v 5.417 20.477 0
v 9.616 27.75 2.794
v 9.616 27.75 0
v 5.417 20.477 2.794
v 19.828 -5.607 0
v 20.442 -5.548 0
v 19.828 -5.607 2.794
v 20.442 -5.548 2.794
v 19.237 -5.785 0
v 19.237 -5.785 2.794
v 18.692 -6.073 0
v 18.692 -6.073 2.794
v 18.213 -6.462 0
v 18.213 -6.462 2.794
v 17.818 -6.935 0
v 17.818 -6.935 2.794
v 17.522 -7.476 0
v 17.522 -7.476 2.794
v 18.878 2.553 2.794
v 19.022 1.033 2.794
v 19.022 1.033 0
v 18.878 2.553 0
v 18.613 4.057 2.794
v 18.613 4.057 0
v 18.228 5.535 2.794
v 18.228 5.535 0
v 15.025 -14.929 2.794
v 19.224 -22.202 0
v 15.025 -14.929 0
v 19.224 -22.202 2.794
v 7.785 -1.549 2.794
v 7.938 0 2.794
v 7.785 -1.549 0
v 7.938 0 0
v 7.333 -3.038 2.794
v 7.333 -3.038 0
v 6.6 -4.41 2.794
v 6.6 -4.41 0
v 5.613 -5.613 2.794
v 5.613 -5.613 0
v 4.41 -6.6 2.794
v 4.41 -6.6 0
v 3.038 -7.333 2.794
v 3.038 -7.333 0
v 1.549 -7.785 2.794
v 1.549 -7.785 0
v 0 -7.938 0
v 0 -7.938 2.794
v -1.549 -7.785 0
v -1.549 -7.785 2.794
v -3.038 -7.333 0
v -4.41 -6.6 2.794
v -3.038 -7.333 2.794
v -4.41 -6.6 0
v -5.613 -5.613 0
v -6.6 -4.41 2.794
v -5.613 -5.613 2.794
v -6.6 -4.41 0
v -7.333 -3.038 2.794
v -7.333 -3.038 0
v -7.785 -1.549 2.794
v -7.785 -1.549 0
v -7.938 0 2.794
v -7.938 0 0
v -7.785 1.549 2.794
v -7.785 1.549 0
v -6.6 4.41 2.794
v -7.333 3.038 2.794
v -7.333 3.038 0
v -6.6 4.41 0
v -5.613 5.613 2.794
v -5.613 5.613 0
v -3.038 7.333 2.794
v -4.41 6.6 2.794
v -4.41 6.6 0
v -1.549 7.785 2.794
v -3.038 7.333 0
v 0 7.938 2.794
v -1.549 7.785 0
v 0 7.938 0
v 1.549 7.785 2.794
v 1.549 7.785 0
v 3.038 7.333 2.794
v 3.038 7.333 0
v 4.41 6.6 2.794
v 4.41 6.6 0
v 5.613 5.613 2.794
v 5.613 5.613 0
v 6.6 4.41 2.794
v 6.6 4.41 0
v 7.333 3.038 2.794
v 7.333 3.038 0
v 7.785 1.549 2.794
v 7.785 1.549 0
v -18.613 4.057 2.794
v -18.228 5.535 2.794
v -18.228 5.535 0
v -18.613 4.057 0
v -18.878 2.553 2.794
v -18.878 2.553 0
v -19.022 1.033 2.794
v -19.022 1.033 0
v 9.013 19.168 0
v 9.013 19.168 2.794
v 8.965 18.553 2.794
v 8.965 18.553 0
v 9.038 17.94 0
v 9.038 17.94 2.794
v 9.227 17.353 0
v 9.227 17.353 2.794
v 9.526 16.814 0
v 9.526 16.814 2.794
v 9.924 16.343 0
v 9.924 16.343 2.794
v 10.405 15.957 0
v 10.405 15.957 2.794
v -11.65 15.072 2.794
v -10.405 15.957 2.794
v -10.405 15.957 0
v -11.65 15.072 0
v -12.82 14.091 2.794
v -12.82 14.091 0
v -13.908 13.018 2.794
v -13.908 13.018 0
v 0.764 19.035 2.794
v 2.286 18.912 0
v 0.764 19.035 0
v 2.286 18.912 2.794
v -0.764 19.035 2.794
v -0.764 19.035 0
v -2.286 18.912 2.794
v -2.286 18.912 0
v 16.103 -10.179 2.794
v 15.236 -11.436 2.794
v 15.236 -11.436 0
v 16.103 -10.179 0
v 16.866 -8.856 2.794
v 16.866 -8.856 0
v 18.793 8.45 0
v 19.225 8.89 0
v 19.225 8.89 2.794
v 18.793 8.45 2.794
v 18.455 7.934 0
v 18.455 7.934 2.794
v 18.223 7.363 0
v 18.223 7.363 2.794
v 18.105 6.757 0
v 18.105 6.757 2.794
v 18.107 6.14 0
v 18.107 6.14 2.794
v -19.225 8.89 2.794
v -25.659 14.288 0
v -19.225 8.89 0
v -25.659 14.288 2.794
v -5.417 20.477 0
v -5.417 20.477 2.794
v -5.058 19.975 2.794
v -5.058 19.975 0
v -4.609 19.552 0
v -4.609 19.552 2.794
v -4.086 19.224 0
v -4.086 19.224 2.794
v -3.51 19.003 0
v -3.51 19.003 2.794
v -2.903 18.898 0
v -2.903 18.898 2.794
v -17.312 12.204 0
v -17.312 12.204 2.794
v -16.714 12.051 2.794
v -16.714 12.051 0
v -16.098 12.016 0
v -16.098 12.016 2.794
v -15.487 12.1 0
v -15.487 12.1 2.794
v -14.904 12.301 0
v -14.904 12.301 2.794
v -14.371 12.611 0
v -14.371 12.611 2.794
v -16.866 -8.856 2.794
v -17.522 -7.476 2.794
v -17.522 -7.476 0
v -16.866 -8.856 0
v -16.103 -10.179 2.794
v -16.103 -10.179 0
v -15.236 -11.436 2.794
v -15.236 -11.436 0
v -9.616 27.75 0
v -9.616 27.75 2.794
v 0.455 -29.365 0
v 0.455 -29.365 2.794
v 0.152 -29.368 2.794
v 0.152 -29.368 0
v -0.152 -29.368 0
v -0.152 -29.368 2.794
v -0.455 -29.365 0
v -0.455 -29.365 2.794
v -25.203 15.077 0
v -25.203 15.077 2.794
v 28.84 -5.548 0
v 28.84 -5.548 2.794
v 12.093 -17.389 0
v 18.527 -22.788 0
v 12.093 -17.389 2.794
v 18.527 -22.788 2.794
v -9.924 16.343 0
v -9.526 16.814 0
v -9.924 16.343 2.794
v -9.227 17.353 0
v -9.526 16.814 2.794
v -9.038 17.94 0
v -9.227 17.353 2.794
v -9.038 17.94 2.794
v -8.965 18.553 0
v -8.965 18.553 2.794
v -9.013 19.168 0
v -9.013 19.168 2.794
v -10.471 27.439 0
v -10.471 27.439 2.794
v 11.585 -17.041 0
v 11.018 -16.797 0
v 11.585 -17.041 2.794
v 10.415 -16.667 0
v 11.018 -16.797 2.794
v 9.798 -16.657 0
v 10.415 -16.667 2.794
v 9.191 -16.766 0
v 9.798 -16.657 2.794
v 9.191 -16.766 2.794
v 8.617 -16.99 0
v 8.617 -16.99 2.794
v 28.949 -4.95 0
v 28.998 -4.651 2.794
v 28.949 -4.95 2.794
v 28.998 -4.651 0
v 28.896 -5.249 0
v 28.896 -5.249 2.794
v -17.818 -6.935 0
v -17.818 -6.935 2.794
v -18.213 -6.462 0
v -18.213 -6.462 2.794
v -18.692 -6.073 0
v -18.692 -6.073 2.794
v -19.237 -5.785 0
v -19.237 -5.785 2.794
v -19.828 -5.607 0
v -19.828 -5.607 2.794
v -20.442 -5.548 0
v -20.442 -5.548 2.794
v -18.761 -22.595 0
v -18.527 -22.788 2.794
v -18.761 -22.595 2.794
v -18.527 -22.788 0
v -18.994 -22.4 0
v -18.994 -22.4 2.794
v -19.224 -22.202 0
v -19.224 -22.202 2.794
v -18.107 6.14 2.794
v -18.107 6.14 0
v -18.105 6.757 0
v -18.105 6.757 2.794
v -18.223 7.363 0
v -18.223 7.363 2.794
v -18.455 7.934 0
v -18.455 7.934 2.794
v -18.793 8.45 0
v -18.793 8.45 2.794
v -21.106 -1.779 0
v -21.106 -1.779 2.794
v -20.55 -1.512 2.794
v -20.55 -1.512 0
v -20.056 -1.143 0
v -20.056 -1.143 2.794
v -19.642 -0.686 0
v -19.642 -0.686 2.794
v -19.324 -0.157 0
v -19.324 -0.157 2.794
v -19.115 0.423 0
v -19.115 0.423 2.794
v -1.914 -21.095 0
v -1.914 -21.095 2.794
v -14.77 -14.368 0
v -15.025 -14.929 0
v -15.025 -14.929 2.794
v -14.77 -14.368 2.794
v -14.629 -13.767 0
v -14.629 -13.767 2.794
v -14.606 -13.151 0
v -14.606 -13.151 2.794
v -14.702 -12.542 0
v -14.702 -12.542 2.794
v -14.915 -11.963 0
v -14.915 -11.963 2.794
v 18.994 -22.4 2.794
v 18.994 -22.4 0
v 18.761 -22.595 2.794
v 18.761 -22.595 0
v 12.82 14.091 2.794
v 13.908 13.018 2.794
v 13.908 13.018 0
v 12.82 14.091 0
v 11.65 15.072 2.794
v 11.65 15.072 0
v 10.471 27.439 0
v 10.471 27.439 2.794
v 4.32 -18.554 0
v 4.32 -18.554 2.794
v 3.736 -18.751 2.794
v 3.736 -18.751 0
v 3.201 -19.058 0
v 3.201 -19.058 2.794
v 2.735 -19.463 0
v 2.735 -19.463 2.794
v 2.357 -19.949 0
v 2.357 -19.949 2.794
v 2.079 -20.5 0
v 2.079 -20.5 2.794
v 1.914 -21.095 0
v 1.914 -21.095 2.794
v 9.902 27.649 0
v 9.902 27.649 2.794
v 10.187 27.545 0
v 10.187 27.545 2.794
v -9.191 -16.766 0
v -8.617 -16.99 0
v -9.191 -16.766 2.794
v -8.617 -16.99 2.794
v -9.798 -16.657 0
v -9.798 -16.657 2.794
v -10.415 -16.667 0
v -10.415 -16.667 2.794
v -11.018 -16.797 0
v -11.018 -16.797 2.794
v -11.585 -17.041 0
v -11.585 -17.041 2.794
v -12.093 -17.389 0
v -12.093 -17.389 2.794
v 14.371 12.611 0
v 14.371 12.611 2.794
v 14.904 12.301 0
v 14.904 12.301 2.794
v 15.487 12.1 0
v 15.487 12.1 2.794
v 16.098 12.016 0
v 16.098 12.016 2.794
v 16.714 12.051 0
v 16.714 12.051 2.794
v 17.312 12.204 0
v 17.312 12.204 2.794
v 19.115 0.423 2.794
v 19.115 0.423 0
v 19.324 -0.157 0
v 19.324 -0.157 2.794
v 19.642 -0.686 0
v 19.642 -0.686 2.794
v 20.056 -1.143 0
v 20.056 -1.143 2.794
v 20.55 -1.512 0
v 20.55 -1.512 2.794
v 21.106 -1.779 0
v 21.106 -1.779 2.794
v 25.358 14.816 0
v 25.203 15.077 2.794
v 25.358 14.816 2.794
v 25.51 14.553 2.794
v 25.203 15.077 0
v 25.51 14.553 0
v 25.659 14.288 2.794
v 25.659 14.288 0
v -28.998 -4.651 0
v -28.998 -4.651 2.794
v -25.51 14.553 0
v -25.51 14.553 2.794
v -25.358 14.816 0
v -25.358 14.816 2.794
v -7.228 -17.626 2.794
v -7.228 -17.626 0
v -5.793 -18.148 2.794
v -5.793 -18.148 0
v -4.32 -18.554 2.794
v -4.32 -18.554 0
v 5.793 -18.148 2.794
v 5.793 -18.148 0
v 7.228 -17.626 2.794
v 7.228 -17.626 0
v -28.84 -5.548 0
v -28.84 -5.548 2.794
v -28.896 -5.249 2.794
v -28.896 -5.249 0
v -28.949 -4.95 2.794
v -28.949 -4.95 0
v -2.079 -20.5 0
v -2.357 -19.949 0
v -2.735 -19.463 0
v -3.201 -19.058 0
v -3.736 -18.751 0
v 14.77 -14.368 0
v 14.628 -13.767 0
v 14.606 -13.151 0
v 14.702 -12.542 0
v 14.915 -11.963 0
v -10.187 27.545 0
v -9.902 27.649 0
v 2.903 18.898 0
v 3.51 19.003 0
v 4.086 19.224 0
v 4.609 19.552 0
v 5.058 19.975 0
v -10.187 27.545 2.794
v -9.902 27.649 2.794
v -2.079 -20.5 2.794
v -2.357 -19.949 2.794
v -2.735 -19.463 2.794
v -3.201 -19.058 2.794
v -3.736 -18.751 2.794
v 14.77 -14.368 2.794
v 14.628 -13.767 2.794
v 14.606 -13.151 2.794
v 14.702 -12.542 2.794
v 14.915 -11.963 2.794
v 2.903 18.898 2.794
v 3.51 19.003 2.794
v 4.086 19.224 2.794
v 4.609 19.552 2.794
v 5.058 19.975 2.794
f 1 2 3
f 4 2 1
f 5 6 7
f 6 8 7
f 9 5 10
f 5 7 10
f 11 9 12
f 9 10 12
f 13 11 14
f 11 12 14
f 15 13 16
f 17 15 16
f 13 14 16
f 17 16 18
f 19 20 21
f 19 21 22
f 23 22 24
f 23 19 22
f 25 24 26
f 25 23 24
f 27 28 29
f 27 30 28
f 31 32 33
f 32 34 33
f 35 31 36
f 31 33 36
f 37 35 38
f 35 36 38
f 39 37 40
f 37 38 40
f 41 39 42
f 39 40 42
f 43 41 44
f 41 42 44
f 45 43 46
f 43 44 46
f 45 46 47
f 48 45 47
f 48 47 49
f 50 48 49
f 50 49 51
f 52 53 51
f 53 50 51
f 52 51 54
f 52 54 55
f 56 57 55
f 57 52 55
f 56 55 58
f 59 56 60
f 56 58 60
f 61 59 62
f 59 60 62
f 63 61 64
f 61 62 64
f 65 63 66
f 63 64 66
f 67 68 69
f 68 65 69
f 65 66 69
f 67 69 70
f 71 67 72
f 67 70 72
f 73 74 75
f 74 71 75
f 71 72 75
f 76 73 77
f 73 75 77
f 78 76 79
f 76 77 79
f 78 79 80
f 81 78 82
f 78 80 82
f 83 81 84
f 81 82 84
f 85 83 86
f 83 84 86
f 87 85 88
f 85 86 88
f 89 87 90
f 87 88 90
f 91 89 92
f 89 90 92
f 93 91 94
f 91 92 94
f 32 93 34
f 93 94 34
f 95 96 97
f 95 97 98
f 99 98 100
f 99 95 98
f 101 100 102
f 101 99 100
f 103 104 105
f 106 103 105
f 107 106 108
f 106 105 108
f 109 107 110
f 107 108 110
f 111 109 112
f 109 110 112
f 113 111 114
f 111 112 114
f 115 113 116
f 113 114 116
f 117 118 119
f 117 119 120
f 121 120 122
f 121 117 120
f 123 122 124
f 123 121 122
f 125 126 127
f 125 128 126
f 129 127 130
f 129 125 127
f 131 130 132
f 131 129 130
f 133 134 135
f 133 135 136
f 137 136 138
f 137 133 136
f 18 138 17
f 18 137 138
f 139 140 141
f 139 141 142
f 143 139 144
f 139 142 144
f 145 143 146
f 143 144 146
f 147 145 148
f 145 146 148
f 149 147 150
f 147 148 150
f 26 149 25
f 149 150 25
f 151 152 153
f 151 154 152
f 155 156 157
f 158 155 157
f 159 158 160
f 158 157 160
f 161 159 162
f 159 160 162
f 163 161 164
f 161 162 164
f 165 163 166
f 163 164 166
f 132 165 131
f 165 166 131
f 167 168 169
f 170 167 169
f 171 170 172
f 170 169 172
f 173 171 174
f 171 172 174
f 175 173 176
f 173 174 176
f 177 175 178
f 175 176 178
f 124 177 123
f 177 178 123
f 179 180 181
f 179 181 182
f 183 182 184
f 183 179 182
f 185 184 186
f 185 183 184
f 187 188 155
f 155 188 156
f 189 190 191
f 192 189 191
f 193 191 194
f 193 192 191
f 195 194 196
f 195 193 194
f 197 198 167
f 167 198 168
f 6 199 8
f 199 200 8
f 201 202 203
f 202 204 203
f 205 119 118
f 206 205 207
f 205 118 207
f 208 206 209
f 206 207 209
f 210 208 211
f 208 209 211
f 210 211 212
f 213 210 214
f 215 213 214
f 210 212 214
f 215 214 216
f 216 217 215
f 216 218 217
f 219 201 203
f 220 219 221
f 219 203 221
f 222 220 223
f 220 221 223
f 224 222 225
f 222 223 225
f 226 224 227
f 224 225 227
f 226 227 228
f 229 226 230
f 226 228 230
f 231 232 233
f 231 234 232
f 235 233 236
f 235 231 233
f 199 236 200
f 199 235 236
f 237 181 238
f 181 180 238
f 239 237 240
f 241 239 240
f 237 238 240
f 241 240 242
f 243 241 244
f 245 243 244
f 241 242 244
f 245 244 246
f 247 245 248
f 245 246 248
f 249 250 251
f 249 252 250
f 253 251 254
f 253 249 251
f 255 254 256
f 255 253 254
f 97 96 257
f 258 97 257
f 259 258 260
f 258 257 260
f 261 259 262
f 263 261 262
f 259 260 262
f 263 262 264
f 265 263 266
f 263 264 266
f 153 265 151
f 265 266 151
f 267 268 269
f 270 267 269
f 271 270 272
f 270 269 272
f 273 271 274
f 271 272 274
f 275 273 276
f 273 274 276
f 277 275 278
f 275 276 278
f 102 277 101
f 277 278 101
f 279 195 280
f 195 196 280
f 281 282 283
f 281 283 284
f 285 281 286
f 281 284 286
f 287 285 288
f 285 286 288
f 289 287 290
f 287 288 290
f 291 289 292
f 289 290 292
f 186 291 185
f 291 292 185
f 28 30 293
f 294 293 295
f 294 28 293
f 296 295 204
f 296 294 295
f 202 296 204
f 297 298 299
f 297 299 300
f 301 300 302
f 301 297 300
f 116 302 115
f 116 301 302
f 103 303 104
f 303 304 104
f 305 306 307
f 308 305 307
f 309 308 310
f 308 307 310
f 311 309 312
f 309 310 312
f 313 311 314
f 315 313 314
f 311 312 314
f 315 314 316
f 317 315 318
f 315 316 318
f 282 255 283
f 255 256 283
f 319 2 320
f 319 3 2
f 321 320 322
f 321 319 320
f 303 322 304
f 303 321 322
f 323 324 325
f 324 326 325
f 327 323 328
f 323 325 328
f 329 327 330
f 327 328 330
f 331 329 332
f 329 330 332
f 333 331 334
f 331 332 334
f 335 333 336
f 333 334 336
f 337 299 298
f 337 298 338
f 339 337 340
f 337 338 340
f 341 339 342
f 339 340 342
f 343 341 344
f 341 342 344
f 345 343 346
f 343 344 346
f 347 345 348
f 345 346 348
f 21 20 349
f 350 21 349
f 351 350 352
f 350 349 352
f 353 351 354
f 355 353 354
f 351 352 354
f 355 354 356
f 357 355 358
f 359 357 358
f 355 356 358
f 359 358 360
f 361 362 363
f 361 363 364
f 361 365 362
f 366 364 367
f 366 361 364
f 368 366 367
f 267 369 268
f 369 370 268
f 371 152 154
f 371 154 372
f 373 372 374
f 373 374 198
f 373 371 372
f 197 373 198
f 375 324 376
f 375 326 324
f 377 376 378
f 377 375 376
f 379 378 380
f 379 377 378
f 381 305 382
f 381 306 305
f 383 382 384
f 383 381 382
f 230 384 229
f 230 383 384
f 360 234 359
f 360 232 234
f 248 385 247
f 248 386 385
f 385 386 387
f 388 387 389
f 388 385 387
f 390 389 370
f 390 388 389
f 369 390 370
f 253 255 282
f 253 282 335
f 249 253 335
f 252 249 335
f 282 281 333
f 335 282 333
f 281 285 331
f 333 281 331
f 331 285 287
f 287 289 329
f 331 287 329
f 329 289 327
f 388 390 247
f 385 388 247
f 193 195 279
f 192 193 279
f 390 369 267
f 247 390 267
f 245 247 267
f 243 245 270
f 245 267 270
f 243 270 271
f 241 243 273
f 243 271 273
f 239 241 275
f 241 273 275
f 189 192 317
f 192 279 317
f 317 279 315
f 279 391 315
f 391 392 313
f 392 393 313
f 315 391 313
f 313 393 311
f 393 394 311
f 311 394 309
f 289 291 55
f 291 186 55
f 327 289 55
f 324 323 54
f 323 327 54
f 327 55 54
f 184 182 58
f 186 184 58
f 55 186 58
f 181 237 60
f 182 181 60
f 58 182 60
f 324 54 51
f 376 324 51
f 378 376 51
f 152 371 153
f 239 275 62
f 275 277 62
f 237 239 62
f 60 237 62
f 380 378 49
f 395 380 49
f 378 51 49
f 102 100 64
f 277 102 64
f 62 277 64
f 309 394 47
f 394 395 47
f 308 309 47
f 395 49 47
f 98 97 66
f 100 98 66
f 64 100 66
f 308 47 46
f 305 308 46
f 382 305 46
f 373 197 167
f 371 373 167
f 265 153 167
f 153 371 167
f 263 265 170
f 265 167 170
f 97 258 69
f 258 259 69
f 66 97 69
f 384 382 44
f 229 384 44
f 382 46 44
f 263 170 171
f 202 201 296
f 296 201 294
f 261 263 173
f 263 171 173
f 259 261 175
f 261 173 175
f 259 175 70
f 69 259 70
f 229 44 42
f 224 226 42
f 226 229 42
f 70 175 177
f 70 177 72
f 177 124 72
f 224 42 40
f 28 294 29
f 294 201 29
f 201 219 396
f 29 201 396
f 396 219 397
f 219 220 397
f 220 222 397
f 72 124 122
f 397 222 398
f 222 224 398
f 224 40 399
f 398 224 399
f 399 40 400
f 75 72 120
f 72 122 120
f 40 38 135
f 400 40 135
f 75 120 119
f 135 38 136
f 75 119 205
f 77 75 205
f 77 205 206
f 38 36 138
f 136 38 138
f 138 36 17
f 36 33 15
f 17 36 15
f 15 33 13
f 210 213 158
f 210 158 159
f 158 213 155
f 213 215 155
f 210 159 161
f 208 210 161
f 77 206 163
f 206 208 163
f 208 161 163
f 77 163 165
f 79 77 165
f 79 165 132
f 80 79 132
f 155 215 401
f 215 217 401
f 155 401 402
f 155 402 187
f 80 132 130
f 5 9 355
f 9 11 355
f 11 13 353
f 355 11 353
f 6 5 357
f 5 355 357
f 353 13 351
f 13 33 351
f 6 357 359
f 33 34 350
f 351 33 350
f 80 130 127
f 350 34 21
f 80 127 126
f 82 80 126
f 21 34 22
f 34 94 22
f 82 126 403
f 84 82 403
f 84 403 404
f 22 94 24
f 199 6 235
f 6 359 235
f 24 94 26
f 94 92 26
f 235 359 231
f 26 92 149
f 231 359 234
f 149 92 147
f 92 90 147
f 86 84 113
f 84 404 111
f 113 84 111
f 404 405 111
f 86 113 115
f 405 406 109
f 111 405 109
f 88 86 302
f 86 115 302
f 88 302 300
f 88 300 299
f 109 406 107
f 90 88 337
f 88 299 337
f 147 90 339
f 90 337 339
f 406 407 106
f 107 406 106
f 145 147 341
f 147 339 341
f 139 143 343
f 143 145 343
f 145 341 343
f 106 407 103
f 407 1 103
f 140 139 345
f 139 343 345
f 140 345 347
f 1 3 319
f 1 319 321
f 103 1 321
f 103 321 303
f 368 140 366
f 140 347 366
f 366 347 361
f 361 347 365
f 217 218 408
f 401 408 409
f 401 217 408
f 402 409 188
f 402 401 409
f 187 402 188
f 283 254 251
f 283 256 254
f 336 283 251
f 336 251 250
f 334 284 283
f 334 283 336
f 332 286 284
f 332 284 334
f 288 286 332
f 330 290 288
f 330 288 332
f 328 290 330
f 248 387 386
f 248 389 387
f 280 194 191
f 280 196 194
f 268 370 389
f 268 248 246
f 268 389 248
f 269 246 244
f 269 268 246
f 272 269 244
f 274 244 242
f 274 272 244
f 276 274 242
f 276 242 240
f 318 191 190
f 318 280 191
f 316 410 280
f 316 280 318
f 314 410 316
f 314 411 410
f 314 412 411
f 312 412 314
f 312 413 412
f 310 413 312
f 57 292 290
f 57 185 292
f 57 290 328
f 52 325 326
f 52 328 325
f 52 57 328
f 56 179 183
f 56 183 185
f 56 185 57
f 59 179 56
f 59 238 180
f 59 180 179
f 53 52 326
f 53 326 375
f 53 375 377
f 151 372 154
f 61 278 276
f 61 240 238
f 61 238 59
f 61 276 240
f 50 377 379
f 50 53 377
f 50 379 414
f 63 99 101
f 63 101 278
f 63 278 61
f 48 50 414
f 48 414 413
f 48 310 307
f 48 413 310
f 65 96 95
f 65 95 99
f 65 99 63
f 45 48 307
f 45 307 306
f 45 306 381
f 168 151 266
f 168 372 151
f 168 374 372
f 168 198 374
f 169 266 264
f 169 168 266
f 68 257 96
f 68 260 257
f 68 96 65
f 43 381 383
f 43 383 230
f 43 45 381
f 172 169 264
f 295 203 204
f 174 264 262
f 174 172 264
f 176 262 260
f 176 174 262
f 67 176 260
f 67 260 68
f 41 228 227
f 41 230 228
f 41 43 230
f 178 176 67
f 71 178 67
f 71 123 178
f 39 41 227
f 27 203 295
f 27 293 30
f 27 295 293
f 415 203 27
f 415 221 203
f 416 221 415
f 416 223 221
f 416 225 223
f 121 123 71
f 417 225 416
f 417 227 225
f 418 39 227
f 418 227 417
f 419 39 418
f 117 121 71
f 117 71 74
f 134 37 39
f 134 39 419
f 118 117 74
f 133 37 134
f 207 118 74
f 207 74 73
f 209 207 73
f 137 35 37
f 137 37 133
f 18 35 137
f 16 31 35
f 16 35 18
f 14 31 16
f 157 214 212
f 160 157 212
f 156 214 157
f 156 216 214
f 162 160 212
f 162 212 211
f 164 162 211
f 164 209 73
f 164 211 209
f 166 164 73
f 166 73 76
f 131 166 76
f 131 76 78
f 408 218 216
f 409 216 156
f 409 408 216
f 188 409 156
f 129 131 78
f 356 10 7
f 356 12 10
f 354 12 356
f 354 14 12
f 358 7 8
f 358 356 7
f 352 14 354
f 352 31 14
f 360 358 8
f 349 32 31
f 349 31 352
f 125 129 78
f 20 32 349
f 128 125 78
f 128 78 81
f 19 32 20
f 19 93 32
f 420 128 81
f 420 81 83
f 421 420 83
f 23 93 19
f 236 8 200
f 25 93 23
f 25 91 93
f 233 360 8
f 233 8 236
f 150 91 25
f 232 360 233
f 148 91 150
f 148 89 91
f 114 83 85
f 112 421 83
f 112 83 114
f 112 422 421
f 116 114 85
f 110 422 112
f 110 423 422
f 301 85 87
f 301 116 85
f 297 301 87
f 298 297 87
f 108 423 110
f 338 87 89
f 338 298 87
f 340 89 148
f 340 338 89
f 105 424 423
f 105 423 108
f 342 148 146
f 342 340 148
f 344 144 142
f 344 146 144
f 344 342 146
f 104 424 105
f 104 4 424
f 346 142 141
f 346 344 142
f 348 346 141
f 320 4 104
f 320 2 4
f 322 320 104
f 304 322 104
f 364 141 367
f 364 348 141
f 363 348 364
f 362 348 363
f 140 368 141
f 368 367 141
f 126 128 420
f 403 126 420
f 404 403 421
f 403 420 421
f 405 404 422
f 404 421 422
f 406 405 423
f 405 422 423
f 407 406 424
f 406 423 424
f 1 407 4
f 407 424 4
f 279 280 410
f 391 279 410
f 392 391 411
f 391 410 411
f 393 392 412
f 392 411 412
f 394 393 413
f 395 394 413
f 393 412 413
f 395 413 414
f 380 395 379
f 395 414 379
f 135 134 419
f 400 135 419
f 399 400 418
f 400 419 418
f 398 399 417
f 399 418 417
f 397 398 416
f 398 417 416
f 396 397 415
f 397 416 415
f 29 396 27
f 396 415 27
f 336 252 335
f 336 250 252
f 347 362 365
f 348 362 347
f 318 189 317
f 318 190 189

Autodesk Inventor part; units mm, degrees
ref_plane "YZ Plane" through (0, 0, 0) normal (1, 0, 0) x (0, 1, 0)
ref_plane "XZ Plane" through (0, 0, 0) normal (0, 1, 0) x (-1, 0, 0)
ref_plane "XY Plane" through (0, 0, 0) normal (0, 0, 1) x (1, 0, 0)
sketch "Sketch1" plane through (0, 0, 0) normal (0, 0, 1) x (1, 0, 0)
  line L0 (27.5881, 10.0556) -> (27.8558, 9.3368) construction
  line L1 (27.8558, 9.3368) -> (21.3609, 5.6433) construction
  arc A0 (21.3609, 5.6433) -> (19.6075, 2.6357) centre (22.5174, 2.9541) ccw construction
  arc A1 (19.529, -3.031) -> (19.6075, 2.6357) centre (-6.8308, 0.1684) ccw construction
  arc A2 (19.529, -3.031) -> (21.1242, -6.2153) centre (22.4904, -3.5391) ccw construction
  line L2 (27.6234, -9.961) -> (21.1242, -6.2153) construction
  line L3 (27.6234, -9.961) -> (27.3665, -10.6837) construction
  line L4 (14.515, -25.5221) -> (13.8537, -25.9105)
  circle A3 centre (0, 0) radius 7.9375
  circle A4 centre (0, 0) radius 29.3688
  point P0 (27.495, -10.3223)
  point P1 (27.722, 9.6962)
  dimension "d0" = 15.875
  dimension "d1" = 26.5532
  dimension "d2" = 58.7375
extrude "Extrusion1" add sketch "Sketch1" along normal blind 2.794
sketch "Sketch2" plane through (0, 0, 2.794) normal (0, 0, 1) x (1, 0, 0)
  line L0 (-9.6157, 27.75) -> (-5.4166, 20.4769)
  arc A0 (-5.4166, 20.4769) -> (-2.286, 18.9123) centre (-2.667, 22.0644) ccw
  arc A1 (2.286, 18.9123) -> (5.4166, 20.4769) centre (2.667, 22.0644) ccw
  line L1 (9.6157, 27.75) -> (5.4166, 20.4769)
  line L2 (0, 0) -> (0, 29.4775) construction
  arc A2 (2.286, 18.9123) -> (-2.286, 18.9123) centre (0, 0) ccw
  circle A3 centre (0, 0) radius 29.3687 projected
  dimension "d8" = 60
  dimension "d9" = 19.05
  dimension "d10" = 3.175
  dimension "d11" = 5.334
extrude "Extrusion2" cut sketch "Sketch2" against normal through all contours A3 L1 A1 A2 A0 L0 picked at (0.2545, 25.8031)
pattern_circular "Circular Pattern1" count 9 over 360 about axis through (0, 0, 0) along (0, 0, 1) of "Extrusion2"
properties part number "ROLLER,5"
